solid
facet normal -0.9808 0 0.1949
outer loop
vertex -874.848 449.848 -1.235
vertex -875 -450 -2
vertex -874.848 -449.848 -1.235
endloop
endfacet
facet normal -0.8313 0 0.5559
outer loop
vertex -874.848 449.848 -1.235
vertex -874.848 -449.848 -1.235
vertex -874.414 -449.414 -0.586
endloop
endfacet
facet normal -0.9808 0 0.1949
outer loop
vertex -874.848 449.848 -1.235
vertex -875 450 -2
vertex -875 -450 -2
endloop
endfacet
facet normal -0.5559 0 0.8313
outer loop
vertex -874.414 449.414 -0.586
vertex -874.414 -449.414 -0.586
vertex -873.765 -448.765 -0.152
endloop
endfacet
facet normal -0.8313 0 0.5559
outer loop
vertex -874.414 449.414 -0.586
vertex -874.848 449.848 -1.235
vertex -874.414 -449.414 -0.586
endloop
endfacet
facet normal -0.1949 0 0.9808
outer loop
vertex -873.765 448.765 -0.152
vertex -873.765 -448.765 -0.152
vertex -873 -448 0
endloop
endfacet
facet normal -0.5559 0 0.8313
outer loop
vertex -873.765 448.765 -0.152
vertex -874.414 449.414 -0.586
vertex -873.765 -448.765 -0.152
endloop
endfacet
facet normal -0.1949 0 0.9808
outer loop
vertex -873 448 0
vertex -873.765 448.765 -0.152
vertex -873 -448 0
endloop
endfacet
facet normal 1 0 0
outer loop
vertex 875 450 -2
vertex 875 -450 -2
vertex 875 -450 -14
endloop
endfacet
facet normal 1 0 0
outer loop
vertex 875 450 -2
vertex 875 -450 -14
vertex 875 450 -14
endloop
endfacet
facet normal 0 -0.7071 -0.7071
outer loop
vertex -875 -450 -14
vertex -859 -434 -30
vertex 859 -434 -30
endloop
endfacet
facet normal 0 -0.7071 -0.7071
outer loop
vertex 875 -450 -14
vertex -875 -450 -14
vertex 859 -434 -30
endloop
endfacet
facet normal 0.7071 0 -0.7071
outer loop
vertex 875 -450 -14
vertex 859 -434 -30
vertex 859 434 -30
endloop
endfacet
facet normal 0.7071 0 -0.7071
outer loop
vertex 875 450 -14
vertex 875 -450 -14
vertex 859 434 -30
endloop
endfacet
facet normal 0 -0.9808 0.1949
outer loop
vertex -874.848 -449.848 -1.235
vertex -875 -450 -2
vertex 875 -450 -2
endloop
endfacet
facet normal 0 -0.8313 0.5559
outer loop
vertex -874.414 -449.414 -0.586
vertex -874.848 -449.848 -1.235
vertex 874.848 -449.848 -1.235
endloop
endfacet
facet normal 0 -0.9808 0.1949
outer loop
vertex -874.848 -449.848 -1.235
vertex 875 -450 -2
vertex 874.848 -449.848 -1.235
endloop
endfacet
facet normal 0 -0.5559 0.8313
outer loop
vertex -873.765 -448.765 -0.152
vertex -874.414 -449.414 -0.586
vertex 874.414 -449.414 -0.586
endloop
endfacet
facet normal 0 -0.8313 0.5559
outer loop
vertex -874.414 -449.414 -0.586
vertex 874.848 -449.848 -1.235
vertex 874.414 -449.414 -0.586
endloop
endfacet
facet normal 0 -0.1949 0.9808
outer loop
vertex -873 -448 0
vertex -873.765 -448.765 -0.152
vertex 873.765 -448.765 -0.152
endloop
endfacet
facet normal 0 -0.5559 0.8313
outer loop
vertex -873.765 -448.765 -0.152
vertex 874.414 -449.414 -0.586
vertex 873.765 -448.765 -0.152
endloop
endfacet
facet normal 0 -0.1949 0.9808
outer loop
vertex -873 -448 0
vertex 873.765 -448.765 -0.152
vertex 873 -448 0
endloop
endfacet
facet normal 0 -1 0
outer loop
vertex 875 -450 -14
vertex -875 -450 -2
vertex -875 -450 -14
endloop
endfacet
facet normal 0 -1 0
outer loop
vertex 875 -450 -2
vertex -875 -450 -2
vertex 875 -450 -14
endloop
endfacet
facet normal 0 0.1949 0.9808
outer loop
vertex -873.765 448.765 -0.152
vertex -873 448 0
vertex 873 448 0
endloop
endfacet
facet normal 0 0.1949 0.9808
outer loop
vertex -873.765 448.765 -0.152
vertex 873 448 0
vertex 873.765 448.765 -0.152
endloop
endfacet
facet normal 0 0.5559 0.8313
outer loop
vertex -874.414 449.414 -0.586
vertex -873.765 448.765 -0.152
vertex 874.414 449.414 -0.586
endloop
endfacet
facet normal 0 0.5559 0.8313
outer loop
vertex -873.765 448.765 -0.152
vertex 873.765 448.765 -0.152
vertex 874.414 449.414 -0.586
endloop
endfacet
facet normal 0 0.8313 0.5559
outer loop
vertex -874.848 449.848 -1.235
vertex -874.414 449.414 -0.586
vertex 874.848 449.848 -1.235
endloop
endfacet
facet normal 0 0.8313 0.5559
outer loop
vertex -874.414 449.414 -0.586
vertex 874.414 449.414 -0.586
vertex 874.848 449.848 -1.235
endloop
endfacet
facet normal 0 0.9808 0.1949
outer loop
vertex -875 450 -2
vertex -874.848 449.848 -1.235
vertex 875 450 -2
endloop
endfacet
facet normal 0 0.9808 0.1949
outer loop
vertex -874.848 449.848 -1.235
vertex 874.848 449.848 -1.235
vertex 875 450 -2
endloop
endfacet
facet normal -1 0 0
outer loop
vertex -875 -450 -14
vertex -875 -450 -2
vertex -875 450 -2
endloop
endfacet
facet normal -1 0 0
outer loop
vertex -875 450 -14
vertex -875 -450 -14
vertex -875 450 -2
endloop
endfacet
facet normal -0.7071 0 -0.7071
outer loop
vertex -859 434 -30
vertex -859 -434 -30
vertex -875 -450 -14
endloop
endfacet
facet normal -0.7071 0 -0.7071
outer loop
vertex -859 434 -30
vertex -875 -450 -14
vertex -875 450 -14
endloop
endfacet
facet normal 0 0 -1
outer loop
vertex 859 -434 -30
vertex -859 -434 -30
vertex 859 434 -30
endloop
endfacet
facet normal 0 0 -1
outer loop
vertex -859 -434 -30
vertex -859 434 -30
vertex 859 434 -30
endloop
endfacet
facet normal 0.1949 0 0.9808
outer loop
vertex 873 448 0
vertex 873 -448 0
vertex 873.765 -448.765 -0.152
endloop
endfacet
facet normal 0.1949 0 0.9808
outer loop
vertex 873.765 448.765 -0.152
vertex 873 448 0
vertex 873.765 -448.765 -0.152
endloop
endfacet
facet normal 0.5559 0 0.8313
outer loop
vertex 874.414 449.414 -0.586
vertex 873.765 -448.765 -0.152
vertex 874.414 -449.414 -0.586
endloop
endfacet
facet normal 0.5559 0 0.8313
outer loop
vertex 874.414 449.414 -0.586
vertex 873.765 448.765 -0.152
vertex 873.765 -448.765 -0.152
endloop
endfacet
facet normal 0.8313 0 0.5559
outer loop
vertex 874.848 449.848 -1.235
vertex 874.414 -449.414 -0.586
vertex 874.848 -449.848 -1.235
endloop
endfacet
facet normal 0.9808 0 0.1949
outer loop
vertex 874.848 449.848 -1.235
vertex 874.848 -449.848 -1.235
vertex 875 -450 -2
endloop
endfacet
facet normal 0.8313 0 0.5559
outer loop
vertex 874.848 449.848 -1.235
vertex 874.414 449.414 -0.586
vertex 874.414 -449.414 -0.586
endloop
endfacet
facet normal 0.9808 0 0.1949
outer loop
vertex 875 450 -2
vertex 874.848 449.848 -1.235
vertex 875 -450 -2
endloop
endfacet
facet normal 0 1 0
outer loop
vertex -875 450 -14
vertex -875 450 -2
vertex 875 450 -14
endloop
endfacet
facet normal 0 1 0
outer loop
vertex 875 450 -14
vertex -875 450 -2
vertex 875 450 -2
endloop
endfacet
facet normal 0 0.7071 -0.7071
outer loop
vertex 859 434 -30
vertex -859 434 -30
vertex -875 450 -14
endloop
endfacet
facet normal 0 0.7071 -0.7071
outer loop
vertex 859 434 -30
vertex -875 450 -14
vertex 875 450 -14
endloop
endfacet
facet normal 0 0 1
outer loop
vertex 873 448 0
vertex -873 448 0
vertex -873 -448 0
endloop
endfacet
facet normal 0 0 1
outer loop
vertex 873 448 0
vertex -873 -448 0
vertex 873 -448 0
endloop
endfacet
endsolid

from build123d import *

# Parameters (mm, degrees)
F0_W     = 1750
F0_H     = 900
F1_DEPTH = 30
F2_SIZE  = 16
F3_R     = 2


with BuildPart() as f1:
    # F0 (on Top) → F1 (new body)
    with BuildSketch(Plane.XY):
        Rectangle(F0_W, F0_H)
    extrude(amount=-F1_DEPTH)

    # F2
    f2_edges = [f1.edges().sort_by_distance(p)[0] for p in [
        (0, -450, -30),
        (-875, 0, -30),
        (0, 450, -30),
        (875, 0, -30),
    ]]
    chamfer(f2_edges, length=F2_SIZE)

    # F3
    f3_edges = [f1.edges().sort_by_distance(p)[0] for p in [
        (0, 450, 0),
        (875, 0, 0),
        (0, -450, 0),
        (-875, 0, 0),
    ]]
    fillet(f3_edges, radius=F3_R)


solid = f1.part
